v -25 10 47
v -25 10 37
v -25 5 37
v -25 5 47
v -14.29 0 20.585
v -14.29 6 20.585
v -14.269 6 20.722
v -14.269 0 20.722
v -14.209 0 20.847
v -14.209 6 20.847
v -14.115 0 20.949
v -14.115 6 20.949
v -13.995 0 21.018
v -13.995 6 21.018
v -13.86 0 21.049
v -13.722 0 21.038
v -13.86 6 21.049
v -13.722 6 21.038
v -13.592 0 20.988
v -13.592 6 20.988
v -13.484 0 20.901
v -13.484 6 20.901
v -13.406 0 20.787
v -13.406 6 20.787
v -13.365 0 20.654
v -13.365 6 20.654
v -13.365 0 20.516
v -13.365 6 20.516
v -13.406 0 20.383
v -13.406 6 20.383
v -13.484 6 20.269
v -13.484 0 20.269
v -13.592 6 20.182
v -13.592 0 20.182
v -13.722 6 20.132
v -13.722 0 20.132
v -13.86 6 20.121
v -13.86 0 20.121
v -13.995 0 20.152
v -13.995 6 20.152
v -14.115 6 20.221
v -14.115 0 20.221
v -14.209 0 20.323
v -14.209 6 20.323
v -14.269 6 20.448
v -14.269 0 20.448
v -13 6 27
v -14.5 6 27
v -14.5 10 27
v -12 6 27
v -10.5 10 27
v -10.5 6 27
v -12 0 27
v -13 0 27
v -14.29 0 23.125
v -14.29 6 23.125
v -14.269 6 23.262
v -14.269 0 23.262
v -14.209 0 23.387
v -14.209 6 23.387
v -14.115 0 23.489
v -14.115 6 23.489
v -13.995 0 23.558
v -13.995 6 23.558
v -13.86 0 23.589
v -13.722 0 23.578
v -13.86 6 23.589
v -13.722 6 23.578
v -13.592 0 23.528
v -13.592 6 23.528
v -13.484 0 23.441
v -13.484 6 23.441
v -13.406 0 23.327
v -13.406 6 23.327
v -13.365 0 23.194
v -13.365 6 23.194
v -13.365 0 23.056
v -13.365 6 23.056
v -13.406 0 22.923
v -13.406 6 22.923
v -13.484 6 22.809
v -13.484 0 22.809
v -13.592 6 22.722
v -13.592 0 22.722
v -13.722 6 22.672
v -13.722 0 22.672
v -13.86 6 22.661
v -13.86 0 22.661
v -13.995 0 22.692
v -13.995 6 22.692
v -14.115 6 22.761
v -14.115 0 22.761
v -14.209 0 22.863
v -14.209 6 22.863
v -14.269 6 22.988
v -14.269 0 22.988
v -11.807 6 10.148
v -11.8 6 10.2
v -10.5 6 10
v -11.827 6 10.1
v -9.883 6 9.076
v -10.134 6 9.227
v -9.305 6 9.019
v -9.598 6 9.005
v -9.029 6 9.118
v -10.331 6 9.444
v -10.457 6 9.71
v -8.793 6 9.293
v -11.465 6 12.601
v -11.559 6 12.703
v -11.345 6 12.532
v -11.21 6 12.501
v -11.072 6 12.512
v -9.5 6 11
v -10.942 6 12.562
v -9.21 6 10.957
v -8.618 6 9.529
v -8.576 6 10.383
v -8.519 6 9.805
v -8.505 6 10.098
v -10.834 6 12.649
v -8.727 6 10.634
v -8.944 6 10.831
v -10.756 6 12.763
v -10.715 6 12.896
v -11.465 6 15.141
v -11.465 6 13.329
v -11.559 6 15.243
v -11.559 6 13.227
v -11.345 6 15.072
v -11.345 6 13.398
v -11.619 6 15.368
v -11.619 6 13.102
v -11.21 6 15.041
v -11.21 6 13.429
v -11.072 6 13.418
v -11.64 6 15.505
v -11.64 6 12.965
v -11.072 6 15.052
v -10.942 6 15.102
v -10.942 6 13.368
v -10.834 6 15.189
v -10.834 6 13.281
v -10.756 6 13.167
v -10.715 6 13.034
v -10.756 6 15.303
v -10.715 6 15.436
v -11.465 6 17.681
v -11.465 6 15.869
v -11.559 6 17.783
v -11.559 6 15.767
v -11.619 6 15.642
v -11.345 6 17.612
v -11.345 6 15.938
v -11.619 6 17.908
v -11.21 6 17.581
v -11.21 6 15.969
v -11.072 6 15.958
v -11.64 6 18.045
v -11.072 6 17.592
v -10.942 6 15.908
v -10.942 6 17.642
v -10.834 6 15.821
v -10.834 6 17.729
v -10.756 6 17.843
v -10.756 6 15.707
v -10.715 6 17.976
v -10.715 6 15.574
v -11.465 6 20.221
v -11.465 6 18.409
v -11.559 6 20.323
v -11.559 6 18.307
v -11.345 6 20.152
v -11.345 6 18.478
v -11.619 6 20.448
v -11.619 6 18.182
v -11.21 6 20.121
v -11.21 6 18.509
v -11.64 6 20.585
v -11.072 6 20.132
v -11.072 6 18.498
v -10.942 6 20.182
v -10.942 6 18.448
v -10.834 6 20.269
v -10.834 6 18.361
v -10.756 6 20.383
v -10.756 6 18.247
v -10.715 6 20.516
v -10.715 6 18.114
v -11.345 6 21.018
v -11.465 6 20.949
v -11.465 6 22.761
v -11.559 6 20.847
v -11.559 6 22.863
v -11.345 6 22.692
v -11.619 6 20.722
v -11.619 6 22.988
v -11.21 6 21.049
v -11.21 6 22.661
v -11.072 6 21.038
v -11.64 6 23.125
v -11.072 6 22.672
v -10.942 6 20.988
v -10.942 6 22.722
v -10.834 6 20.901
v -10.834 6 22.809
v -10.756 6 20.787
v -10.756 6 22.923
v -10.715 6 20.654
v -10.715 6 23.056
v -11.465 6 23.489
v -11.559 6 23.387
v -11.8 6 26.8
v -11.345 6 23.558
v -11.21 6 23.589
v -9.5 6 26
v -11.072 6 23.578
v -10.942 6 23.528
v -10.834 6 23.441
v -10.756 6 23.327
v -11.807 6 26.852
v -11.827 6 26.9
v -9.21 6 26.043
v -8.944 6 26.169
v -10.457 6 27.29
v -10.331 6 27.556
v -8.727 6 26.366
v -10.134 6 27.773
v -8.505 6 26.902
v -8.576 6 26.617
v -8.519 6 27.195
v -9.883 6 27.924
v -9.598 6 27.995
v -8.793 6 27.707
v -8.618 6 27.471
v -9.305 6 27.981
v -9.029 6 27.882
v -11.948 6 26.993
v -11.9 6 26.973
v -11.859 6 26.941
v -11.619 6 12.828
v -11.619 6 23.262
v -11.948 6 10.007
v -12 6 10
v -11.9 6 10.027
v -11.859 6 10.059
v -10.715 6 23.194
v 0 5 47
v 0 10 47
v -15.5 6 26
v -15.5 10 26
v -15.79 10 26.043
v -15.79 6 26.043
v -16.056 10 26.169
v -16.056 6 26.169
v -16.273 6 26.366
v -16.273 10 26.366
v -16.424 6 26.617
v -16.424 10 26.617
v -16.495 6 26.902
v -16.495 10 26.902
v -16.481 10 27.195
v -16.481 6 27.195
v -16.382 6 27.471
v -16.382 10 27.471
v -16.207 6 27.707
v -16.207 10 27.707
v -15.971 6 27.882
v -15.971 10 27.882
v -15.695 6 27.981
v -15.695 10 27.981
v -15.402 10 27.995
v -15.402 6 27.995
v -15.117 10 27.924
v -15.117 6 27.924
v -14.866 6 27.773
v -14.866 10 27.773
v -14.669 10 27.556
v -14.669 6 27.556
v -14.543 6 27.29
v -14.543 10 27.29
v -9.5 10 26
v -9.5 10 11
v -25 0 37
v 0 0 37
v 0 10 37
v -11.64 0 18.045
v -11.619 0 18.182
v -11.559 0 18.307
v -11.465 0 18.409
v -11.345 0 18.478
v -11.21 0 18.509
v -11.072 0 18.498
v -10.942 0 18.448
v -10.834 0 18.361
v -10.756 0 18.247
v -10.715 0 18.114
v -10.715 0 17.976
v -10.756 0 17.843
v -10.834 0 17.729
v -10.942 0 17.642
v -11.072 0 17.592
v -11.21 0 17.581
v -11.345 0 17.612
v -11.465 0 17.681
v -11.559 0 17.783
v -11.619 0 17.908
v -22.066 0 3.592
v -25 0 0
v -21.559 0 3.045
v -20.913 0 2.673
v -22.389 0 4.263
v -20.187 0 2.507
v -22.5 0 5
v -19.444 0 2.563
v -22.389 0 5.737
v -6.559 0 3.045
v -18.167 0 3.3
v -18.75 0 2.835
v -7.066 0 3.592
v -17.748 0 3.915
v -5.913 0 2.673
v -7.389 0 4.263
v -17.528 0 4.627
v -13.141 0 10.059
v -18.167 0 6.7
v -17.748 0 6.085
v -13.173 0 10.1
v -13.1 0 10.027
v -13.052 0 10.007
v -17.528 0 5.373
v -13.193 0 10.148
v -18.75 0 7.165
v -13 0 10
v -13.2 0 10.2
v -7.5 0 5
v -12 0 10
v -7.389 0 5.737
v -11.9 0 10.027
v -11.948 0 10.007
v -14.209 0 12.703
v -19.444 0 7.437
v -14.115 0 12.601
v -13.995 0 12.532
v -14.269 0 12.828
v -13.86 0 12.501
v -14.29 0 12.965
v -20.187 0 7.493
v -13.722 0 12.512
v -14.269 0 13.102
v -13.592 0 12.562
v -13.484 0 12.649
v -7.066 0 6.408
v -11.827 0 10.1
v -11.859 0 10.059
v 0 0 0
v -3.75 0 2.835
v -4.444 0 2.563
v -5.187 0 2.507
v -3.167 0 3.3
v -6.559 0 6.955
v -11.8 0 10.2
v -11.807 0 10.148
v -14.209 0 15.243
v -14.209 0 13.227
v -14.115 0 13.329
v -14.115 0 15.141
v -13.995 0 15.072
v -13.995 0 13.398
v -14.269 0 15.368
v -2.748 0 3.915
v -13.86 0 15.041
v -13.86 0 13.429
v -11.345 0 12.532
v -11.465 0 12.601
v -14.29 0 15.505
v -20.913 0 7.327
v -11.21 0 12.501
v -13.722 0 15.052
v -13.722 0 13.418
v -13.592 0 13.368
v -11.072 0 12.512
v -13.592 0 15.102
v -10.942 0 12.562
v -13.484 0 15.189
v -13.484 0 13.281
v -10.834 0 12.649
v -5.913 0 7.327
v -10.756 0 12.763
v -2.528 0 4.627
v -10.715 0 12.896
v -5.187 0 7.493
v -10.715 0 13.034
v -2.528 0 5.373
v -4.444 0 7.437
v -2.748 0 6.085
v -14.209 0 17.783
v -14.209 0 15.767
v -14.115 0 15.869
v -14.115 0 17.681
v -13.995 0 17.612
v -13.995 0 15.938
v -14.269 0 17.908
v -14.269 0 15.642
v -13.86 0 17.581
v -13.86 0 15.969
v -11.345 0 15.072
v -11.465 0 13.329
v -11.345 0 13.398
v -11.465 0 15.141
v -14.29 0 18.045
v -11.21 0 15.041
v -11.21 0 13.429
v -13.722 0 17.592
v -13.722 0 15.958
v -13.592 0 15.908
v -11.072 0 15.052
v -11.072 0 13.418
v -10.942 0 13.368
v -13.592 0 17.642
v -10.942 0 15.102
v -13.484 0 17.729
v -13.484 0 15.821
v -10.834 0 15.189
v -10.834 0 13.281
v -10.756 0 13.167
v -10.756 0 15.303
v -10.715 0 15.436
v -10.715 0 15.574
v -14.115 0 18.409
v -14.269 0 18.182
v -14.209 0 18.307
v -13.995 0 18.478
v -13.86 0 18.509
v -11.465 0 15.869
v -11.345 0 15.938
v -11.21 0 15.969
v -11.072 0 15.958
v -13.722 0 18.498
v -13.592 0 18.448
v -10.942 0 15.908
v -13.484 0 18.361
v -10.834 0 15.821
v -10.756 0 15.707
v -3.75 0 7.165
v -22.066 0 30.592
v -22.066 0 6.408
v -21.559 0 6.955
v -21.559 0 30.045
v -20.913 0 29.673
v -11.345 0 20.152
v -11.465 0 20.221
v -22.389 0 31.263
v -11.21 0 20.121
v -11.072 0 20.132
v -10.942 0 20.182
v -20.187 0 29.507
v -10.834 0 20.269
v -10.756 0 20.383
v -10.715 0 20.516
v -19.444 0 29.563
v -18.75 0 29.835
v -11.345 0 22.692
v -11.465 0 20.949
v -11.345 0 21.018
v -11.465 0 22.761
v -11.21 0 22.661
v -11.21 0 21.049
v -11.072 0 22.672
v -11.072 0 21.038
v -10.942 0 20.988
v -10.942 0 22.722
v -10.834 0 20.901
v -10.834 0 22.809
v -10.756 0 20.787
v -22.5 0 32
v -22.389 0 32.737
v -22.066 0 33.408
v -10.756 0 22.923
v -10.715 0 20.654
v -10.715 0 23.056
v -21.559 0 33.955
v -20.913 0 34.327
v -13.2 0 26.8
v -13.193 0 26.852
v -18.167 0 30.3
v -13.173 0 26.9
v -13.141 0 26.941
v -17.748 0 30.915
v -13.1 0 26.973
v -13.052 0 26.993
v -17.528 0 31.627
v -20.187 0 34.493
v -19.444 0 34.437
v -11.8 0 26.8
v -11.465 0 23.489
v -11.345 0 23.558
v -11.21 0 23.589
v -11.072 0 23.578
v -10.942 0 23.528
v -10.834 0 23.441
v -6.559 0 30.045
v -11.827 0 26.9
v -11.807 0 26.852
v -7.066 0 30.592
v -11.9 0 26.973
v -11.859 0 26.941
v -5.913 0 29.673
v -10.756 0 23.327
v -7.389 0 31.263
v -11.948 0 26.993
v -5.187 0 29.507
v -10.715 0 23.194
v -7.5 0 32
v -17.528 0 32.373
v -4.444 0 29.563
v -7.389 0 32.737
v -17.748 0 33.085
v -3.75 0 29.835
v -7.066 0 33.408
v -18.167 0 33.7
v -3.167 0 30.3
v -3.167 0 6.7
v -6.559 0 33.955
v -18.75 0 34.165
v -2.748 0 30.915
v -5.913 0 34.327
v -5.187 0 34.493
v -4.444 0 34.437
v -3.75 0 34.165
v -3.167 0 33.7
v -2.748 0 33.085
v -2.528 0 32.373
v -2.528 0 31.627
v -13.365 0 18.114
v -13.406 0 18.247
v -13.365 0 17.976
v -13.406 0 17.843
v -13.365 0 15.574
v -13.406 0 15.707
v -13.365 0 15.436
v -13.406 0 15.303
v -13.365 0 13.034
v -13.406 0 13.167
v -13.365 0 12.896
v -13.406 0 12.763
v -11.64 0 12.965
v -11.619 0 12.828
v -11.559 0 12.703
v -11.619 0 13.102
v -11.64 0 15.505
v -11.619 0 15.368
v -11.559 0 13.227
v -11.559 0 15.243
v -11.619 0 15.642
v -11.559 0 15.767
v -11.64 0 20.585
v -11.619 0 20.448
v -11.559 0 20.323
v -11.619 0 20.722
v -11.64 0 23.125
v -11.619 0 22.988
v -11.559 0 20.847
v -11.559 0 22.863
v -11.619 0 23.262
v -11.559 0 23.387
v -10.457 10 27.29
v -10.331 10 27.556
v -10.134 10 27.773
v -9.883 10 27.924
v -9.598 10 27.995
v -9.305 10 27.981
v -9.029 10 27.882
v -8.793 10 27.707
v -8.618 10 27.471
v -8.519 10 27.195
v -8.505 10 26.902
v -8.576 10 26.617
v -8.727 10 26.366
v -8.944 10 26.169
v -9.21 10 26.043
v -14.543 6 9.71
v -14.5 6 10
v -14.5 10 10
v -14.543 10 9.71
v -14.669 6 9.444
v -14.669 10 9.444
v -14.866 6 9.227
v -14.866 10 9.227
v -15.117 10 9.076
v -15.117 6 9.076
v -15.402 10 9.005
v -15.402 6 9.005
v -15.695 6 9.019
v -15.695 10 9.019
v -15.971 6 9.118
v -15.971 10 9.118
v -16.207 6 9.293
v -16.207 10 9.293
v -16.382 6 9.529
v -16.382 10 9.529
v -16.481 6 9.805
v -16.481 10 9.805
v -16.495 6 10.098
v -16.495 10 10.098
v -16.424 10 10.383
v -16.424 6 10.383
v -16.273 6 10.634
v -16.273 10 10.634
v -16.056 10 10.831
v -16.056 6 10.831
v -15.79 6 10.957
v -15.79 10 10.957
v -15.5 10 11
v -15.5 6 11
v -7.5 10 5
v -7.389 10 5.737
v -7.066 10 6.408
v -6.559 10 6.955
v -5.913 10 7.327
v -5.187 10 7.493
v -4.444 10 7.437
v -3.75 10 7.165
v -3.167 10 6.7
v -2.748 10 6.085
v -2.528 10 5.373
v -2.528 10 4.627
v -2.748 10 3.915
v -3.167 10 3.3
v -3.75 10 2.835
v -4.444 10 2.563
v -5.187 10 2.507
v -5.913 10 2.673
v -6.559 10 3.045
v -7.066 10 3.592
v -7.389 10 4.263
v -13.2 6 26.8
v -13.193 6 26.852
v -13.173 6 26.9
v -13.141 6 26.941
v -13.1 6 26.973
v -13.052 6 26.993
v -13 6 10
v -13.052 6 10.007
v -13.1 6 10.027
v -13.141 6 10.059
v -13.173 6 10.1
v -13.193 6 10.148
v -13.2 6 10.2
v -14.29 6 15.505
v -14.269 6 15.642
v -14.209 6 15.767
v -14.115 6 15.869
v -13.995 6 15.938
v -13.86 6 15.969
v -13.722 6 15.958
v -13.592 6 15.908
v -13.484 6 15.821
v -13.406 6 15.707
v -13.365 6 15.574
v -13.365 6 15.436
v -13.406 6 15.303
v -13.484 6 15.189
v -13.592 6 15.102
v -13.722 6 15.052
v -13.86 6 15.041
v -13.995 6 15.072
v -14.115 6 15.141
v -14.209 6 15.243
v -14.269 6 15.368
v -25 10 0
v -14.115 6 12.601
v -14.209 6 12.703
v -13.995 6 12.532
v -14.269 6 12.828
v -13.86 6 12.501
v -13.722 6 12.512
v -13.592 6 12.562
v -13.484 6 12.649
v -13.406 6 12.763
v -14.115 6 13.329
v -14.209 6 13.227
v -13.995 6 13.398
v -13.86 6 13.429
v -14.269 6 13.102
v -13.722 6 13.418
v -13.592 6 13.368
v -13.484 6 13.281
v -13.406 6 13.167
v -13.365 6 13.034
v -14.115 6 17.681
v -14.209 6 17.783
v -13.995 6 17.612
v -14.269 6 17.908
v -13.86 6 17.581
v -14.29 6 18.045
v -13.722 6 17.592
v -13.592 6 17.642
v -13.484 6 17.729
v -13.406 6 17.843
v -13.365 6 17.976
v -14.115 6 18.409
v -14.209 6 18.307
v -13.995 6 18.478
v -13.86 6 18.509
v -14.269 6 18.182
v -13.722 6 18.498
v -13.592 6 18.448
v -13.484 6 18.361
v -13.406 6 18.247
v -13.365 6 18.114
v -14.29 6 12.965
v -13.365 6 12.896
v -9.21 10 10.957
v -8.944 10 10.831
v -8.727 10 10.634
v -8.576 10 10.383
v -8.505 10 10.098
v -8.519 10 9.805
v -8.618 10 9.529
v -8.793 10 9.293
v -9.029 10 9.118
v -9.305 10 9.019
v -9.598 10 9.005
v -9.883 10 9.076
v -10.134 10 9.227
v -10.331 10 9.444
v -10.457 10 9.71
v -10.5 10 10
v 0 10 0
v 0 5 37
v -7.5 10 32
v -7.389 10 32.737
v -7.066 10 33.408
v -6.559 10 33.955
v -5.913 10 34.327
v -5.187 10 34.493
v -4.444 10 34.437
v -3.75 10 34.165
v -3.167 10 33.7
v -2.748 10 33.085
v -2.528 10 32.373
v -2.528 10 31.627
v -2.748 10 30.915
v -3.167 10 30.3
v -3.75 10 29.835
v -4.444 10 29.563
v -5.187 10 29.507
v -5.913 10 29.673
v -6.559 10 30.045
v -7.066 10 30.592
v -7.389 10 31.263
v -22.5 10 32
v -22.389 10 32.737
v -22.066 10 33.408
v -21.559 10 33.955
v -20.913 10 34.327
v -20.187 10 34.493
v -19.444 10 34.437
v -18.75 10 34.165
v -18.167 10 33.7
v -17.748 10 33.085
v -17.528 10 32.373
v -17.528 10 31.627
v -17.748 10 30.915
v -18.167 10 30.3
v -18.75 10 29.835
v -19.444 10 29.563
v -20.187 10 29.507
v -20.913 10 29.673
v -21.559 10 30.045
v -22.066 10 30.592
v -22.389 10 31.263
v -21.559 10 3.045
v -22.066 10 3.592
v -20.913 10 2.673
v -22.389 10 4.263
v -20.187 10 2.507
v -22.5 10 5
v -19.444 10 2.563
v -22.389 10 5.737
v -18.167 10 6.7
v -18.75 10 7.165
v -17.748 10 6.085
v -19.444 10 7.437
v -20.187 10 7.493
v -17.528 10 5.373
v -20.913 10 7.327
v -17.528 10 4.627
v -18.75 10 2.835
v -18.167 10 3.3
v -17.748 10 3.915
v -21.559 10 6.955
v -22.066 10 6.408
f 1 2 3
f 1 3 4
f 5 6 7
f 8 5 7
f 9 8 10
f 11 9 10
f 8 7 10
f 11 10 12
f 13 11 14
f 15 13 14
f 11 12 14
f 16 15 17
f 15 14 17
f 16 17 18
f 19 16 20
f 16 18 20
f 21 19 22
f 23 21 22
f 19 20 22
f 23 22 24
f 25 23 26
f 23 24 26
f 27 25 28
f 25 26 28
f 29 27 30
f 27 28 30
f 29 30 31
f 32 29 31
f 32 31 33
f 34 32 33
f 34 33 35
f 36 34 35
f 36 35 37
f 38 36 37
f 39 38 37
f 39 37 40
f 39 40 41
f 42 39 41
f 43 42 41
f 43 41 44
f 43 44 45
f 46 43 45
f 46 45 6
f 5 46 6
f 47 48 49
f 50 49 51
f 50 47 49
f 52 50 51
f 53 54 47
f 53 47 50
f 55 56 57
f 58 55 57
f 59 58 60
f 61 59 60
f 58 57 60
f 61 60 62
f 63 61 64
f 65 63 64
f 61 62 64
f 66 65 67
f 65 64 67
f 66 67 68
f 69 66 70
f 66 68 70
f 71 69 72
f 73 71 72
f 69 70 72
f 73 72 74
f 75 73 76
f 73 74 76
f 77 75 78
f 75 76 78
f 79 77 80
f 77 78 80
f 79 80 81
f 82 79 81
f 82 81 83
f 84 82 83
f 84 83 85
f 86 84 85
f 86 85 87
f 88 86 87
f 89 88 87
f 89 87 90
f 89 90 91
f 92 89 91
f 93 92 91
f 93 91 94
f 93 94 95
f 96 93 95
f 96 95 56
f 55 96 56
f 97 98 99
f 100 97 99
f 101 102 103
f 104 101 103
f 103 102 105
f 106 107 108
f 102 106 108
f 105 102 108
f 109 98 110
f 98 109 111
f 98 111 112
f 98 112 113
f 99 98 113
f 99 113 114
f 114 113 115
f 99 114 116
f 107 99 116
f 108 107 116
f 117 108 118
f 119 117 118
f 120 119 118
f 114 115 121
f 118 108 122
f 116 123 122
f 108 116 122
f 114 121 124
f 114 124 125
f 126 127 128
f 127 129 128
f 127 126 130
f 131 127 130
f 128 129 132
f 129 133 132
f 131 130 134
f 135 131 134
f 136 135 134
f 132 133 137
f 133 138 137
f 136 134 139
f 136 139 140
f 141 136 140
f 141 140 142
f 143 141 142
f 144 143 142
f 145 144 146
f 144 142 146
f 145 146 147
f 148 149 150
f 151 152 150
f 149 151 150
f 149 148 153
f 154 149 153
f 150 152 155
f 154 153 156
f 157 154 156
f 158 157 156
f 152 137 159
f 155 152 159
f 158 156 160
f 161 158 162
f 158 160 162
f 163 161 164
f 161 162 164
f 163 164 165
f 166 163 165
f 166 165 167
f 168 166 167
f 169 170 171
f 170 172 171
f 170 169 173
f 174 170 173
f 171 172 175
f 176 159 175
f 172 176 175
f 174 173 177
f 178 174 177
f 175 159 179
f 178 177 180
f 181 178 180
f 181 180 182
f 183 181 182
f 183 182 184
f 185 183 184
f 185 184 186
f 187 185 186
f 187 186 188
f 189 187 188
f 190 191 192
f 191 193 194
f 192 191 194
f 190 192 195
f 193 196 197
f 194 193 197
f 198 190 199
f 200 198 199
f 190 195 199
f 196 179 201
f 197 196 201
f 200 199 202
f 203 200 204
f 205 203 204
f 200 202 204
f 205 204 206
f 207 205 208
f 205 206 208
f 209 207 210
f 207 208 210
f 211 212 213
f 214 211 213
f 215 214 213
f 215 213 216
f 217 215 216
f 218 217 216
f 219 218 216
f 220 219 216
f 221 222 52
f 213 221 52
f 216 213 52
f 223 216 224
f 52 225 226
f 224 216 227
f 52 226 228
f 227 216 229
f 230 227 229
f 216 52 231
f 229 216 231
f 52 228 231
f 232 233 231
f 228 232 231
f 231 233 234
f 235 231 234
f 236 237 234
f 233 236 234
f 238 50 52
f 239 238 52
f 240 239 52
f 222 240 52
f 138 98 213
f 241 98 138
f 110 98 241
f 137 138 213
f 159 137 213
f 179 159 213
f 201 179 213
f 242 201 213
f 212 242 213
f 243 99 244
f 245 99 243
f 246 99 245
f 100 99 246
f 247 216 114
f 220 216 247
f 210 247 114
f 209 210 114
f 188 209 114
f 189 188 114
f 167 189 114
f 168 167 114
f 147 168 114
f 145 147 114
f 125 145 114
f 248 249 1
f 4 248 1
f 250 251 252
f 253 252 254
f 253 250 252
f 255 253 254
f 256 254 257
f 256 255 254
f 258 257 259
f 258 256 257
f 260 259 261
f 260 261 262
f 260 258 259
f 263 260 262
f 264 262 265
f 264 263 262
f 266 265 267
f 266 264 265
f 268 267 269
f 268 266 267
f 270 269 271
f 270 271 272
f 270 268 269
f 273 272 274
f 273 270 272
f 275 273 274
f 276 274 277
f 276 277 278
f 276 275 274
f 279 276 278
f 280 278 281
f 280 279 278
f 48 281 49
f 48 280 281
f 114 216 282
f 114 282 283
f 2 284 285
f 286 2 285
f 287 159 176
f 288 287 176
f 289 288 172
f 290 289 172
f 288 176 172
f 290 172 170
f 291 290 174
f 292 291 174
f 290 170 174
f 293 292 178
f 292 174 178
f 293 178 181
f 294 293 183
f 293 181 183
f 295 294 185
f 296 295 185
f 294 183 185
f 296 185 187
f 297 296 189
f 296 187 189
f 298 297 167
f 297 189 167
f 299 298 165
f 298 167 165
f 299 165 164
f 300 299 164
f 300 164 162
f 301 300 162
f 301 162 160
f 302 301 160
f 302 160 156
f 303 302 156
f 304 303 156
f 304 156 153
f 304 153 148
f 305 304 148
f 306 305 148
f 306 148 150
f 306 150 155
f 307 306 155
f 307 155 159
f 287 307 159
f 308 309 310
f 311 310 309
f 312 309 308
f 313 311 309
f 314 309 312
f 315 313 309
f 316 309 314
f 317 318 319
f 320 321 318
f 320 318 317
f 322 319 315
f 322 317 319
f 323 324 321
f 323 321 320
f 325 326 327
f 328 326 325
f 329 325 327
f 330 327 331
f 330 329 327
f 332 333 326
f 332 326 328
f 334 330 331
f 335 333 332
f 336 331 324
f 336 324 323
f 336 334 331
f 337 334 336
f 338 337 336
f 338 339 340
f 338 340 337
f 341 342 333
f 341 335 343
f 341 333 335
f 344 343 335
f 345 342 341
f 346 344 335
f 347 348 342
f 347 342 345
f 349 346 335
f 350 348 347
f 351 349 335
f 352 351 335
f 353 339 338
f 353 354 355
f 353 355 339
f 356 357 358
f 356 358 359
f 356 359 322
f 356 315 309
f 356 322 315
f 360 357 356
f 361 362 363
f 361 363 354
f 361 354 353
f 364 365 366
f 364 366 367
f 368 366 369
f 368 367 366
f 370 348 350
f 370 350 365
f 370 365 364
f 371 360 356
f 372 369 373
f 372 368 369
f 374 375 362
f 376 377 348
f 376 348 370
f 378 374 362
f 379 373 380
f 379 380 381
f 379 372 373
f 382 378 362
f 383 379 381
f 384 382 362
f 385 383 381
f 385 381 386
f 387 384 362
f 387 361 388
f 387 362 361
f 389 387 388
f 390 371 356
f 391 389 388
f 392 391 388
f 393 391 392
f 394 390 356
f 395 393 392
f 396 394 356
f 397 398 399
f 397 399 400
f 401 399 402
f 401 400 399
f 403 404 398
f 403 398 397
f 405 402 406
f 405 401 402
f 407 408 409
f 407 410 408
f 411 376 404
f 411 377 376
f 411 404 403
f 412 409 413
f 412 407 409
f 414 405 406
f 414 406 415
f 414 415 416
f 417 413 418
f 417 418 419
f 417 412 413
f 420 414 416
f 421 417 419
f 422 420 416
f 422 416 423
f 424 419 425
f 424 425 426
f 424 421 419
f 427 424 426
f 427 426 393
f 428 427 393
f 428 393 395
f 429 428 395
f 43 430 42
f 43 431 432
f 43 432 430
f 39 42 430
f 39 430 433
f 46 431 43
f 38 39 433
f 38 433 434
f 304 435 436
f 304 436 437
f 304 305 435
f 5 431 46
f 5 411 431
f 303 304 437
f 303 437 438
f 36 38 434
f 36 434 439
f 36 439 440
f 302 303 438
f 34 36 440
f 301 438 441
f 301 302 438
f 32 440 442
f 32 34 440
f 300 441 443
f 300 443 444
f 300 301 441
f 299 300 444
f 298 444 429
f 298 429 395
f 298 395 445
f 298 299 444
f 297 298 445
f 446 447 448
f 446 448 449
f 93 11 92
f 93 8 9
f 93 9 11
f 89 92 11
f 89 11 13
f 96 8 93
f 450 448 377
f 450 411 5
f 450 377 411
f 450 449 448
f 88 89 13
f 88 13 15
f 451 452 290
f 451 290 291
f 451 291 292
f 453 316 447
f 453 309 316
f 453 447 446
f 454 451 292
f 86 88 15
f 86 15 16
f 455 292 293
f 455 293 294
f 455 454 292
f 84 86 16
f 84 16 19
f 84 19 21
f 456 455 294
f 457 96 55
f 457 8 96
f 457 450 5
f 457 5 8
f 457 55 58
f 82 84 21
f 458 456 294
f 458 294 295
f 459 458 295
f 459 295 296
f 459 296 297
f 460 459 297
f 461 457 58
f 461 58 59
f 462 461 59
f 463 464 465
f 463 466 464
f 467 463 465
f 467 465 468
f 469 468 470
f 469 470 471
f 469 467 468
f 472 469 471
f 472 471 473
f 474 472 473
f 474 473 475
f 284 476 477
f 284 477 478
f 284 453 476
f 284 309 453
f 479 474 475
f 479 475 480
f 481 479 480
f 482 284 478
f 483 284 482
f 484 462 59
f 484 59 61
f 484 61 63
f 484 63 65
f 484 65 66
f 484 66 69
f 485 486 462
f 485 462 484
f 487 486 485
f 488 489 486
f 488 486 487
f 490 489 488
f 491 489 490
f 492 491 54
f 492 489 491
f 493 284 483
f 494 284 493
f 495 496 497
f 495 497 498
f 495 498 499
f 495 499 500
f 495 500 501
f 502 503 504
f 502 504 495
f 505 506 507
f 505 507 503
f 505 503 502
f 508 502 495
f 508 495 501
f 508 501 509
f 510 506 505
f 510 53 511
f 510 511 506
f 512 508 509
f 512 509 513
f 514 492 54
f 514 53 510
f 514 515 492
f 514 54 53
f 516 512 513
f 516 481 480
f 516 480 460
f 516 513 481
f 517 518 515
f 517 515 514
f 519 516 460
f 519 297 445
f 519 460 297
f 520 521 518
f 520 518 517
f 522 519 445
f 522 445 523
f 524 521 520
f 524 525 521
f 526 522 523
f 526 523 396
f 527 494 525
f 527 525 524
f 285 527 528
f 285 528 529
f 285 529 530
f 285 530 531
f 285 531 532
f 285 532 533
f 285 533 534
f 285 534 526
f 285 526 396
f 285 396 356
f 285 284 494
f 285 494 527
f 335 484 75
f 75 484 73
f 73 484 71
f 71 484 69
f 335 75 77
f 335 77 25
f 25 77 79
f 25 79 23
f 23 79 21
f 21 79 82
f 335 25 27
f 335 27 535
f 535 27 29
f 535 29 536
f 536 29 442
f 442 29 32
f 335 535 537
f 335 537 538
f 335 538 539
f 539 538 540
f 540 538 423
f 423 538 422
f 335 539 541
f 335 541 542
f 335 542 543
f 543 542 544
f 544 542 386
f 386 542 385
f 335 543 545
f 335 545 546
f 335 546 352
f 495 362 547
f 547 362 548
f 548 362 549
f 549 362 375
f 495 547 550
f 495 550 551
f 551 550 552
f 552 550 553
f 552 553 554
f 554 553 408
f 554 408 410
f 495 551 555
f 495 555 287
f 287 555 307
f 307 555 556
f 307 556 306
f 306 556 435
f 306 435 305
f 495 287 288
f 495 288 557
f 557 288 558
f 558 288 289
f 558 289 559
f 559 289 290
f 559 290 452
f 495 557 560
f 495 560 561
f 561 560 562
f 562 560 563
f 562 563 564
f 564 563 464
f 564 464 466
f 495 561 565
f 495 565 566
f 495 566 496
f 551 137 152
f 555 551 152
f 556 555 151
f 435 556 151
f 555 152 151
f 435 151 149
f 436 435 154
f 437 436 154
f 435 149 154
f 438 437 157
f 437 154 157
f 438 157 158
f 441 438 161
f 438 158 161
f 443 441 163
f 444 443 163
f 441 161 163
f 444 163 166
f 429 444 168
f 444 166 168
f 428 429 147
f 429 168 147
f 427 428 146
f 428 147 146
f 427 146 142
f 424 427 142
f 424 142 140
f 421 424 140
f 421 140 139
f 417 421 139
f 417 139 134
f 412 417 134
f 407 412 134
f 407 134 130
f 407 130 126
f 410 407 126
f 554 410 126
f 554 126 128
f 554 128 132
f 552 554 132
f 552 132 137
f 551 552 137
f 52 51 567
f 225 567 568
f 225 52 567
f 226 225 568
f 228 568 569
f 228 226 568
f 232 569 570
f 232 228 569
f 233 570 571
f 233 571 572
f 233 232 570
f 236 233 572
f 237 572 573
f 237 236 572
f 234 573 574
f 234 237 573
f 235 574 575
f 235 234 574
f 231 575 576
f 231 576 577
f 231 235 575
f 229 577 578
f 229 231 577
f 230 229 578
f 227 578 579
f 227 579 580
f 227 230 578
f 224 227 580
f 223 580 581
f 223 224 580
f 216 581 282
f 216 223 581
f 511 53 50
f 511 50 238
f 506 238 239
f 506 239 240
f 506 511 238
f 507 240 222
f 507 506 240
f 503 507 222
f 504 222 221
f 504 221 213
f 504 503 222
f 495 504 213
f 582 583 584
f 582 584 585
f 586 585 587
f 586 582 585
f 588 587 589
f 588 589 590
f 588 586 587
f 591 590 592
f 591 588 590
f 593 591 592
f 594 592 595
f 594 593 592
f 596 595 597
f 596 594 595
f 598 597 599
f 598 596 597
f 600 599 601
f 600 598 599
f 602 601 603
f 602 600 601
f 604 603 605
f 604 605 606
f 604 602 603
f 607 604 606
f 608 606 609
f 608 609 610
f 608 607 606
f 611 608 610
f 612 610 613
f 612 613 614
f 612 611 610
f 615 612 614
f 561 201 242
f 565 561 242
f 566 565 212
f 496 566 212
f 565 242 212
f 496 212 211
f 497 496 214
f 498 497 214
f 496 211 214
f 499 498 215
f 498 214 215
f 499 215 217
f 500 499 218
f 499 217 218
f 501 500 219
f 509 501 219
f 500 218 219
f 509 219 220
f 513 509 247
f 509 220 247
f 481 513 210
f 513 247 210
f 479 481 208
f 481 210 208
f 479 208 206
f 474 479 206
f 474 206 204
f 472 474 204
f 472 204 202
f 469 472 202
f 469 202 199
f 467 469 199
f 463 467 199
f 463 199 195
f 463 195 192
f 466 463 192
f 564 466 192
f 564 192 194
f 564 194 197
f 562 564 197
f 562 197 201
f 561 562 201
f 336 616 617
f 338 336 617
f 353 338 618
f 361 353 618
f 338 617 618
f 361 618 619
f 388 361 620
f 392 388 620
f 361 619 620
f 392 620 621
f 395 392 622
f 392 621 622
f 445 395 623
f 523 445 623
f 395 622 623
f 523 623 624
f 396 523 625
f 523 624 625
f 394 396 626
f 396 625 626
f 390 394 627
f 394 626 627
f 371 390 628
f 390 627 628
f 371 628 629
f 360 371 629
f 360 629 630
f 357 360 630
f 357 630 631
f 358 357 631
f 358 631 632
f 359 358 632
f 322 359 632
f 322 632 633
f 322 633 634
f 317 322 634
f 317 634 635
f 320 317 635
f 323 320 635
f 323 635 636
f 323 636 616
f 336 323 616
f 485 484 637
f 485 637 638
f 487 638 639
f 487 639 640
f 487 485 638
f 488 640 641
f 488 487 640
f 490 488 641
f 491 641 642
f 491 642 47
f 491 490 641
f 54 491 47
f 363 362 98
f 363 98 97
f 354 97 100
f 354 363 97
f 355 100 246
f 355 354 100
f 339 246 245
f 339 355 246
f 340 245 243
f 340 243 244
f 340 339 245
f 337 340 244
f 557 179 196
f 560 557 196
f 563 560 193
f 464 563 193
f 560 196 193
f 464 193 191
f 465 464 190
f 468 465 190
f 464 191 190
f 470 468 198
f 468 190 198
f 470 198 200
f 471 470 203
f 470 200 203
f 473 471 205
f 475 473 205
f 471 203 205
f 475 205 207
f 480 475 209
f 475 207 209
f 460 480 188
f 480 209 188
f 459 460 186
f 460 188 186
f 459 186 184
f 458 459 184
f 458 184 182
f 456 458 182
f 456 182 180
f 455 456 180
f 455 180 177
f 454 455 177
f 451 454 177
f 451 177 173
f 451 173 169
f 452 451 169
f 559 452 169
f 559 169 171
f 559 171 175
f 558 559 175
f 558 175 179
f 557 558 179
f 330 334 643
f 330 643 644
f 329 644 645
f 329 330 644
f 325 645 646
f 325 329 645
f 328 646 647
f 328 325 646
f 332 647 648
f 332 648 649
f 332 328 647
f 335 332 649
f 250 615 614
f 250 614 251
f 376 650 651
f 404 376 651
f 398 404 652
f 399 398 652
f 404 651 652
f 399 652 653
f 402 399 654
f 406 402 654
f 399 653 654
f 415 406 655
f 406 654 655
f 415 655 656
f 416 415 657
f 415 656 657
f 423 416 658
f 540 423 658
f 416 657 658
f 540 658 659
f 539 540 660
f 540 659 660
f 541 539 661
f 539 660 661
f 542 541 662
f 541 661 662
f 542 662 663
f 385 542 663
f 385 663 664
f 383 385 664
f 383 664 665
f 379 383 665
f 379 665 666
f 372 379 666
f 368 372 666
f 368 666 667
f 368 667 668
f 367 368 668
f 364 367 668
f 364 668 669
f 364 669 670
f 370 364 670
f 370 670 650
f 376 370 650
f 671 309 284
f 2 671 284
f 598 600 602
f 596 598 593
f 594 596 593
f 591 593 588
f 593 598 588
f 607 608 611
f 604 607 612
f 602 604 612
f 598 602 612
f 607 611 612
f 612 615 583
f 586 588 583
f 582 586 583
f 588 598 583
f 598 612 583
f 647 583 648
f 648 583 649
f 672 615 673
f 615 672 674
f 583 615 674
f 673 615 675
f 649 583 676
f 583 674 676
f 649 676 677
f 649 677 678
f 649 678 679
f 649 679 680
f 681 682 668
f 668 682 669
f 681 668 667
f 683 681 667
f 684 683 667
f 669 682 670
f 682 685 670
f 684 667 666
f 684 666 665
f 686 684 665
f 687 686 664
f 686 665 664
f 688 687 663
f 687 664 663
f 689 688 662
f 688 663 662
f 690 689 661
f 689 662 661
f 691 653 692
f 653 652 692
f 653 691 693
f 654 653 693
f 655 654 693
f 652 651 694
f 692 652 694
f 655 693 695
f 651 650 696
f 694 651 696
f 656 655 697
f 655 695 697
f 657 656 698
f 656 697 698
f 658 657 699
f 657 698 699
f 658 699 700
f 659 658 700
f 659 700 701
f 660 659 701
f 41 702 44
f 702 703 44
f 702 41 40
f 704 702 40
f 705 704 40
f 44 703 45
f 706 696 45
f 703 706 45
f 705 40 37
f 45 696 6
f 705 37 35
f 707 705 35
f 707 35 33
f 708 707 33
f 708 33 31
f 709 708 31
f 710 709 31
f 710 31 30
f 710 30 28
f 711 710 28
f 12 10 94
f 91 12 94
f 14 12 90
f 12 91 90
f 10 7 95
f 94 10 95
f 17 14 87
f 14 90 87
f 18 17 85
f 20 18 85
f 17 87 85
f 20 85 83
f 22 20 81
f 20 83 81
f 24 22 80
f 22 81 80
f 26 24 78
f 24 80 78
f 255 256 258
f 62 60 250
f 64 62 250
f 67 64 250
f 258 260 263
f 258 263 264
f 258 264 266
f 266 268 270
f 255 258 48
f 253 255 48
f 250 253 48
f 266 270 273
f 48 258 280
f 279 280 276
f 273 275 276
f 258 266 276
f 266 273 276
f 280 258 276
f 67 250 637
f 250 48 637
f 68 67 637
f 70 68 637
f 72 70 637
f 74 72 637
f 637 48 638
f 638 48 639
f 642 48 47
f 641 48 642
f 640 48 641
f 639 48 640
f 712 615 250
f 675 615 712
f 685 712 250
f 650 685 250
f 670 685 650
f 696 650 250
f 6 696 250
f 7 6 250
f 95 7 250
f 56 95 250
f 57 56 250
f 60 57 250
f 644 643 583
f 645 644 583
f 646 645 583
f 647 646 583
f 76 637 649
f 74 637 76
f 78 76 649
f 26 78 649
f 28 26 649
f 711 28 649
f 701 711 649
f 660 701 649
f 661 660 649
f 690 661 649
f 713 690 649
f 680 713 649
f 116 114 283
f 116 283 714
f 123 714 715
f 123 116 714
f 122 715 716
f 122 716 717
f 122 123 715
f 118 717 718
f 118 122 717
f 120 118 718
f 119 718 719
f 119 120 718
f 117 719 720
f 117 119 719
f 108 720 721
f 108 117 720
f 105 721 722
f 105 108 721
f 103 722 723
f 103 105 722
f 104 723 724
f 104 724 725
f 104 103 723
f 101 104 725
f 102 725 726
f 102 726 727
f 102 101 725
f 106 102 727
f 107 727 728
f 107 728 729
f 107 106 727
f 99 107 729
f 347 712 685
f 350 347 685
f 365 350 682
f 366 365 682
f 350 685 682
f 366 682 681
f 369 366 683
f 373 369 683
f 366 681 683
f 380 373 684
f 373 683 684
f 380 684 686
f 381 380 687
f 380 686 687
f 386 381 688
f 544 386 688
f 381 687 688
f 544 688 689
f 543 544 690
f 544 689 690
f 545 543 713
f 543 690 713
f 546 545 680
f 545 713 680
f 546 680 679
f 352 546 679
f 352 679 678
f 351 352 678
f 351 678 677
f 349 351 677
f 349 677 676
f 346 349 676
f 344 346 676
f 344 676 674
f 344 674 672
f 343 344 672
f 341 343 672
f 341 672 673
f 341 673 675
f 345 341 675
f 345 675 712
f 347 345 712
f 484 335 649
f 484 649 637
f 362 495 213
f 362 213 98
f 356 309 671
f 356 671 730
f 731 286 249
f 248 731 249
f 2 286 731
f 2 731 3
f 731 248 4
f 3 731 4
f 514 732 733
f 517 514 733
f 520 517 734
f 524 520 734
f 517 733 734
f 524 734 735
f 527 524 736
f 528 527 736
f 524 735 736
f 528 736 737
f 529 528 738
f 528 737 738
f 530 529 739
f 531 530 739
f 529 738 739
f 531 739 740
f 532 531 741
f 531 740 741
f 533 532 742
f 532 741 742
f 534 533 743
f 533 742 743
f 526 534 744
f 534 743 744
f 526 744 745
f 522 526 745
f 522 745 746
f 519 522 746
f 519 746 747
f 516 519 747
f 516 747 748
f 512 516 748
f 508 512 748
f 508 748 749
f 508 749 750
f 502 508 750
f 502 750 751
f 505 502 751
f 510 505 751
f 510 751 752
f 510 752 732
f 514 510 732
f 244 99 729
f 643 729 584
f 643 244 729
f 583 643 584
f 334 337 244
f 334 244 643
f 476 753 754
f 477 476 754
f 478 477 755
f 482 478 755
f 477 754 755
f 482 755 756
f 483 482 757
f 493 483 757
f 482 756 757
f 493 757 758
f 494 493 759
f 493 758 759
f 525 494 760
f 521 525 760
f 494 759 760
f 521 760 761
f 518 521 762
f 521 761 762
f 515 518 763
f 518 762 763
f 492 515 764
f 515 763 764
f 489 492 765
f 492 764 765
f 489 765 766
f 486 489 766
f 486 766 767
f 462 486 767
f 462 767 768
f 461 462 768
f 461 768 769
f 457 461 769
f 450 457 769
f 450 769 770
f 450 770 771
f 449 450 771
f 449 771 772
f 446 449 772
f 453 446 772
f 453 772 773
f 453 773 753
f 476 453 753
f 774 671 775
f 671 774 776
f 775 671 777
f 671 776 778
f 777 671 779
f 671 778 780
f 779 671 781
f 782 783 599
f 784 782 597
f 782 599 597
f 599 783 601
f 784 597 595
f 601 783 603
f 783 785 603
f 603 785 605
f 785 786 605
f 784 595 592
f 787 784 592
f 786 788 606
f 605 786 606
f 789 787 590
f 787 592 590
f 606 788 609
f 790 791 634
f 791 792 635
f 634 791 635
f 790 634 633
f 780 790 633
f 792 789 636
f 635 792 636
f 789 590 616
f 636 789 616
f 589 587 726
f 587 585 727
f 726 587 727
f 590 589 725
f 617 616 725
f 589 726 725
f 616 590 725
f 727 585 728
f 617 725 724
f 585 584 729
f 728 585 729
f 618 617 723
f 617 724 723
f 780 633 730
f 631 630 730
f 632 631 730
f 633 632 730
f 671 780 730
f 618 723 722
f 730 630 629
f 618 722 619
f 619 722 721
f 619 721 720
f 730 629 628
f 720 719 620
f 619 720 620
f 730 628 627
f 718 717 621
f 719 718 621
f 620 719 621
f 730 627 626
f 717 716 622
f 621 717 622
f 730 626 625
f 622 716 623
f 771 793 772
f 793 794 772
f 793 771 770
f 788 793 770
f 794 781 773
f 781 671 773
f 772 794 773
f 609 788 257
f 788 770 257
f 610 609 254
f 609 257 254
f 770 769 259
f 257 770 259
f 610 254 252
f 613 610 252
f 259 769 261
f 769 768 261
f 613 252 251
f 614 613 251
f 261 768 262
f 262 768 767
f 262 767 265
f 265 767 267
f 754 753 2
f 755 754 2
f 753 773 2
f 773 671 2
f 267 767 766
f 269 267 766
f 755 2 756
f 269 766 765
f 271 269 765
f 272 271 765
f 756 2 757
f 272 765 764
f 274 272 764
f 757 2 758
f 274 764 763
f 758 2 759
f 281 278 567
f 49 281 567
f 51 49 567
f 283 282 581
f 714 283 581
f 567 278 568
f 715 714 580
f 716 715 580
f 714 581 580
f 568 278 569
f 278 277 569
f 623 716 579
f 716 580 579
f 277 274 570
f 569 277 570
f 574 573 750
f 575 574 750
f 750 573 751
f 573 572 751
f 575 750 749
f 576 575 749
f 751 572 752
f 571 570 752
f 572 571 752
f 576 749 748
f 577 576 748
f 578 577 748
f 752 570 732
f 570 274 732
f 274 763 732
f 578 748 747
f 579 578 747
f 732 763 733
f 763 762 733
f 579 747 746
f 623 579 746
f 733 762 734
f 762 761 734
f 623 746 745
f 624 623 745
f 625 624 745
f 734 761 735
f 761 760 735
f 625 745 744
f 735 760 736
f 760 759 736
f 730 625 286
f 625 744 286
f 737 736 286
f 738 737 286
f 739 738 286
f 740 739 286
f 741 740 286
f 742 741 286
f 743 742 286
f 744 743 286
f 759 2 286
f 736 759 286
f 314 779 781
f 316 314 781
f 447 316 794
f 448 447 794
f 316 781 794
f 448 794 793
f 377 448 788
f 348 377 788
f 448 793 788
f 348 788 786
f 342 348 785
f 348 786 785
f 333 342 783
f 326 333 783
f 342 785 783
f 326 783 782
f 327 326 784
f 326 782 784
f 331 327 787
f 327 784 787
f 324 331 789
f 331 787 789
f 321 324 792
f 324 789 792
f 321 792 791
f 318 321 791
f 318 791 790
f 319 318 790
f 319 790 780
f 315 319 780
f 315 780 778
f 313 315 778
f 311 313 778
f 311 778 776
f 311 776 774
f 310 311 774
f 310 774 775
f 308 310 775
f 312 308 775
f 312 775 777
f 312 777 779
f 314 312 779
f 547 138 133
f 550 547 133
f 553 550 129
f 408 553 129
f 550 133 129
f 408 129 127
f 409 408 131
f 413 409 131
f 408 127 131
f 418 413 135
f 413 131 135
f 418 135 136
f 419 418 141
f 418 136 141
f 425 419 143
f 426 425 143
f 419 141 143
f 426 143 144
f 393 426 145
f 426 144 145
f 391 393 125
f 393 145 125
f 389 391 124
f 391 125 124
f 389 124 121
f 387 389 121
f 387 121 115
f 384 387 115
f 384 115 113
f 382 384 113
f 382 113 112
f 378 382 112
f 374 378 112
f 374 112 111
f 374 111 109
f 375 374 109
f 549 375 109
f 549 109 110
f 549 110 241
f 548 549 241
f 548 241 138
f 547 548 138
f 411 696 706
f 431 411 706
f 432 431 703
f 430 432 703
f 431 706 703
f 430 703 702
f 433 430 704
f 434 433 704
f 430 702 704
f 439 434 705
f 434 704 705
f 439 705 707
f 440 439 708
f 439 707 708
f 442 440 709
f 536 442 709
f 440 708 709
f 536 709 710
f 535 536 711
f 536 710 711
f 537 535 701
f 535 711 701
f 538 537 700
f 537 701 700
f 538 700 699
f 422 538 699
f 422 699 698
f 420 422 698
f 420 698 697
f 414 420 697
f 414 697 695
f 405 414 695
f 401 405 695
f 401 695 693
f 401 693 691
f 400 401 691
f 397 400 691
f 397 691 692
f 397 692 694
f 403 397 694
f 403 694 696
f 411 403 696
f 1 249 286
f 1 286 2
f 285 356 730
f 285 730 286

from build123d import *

# Parameters (mm, degrees)
F0_W     = 25
F0_H     = 37
F1_DEPTH = 10
F2_DEPTH = 6
F3_W     = 25
F3_H     = 10
F4_DEPTH = 5
F5_R     = 0.465
F6_DEPTH = 6.001
F7_R     = 2.5
F8_DEPTH = 10.001


with BuildPart() as f1:
    # F0 (on Front) → F1 (new body)
    with BuildSketch(Plane.XZ):
        with Locations((-12.5, 18.5)):
            Rectangle(F0_W, F0_H)
        with BuildLine():
            ThreePointArc((-15.5, 26), (-16.207107, 27.707107), (-14.5, 27))
            Line((-14.5, 27), (-13, 27))
            Line((-13, 27), (-12, 27))
            Line((-12, 27), (-10.5, 27))
            ThreePointArc((-10.5, 27), (-8.792893, 27.707107), (-9.5, 26))
            Line((-9.5, 26), (-9.5, 11))
            ThreePointArc((-9.5, 11), (-8.792893, 9.292893), (-10.5, 10))
            Line((-10.5, 10), (-12, 10))
            Line((-12, 10), (-13, 10))
            Line((-13, 10), (-14.5, 10))
            ThreePointArc((-14.5, 10), (-16.207107, 9.292893), (-15.5, 11))
            Line((-15.5, 11), (-15.5, 26))
        make_face(mode=Mode.SUBTRACT)
    extrude(amount=-F1_DEPTH)

    # F0 (on Front) → F2 (join)
    with BuildSketch(Plane.XZ):
        with BuildLine():
            Line((-13, 27), (-14.5, 27))
            ThreePointArc((-14.5, 27), (-16.207107, 27.707107), (-15.5, 26))
            Line((-15.5, 26), (-15.5, 11))
            ThreePointArc((-15.5, 11), (-16.207107, 9.292893), (-14.5, 10))
            Line((-14.5, 10), (-13, 10))
            ThreePointArc((-13, 10), (-13.141421, 10.058579), (-13.2, 10.2))
            Line((-13.2, 10.2), (-13.2, 26.8))
            ThreePointArc((-13.2, 26.8), (-13.141421, 26.941421), (-13, 27))
        make_face()
        with BuildLine():
            Line((-10.5, 27), (-12, 27))
            ThreePointArc((-12, 27), (-11.858579, 26.941421), (-11.8, 26.8))
            Line((-11.8, 26.8), (-11.8, 10.2))
            ThreePointArc((-11.8, 10.2), (-11.858579, 10.058579), (-12, 10))
            Line((-12, 10), (-10.5, 10))
            ThreePointArc((-10.5, 10), (-8.792893, 9.292893), (-9.5, 11))
            Line((-9.5, 11), (-9.5, 26))
            ThreePointArc((-9.5, 26), (-8.792893, 27.707107), (-10.5, 27))
        make_face()
    extrude(amount=-F2_DEPTH)

    # F5 (on face) → F6 (cut, through all)
    with BuildSketch(Plane(origin=(0, 6, 0), x_dir=(-1, 0, 0), z_dir=(0, 1, 0))):
        with Locations((13.825, 12.965)):
            Circle(F5_R)
        with Locations((13.825, 15.505)):
            Circle(F5_R)
        with Locations((13.825, 18.045)):
            Circle(F5_R)
        with Locations((13.825, 20.585)):
            Circle(F5_R)
        with Locations((13.825, 23.125)):
            Circle(F5_R)
        with Locations((11.175, 23.125)):
            Circle(F5_R)
        with Locations((11.175, 20.585)):
            Circle(F5_R)
        with Locations((11.175, 18.045)):
            Circle(F5_R)
        with Locations((11.175, 15.505)):
            Circle(F5_R)
        with Locations((11.175, 12.965)):
            Circle(F5_R)
    extrude(amount=-F6_DEPTH, mode=Mode.SUBTRACT)

    # F7 (on face) → F8 (cut, through all)
    with BuildSketch(Plane(origin=(0, 10, 0), x_dir=(-1, 0, 0), z_dir=(0, 1, 0))):
        with Locations((5, 32)):
            Circle(F7_R)
        with Locations((20, 32)):
            Circle(F7_R)
        with Locations((20, 5)):
            Circle(F7_R)
        with Locations((5, 5)):
            Circle(F7_R)
    extrude(amount=-F8_DEPTH, mode=Mode.SUBTRACT)


with BuildPart() as f4:
    # F3 (on face) → F4 (new body)
    with BuildSketch(Plane(origin=(0, 10, 0), x_dir=(-1, 0, 0), z_dir=(0, 1, 0))):
        with Locations((12.5, 42)):
            Rectangle(F3_W, F3_H)
    extrude(amount=-F4_DEPTH)


solid = Compound([f1.part, f4.part])
